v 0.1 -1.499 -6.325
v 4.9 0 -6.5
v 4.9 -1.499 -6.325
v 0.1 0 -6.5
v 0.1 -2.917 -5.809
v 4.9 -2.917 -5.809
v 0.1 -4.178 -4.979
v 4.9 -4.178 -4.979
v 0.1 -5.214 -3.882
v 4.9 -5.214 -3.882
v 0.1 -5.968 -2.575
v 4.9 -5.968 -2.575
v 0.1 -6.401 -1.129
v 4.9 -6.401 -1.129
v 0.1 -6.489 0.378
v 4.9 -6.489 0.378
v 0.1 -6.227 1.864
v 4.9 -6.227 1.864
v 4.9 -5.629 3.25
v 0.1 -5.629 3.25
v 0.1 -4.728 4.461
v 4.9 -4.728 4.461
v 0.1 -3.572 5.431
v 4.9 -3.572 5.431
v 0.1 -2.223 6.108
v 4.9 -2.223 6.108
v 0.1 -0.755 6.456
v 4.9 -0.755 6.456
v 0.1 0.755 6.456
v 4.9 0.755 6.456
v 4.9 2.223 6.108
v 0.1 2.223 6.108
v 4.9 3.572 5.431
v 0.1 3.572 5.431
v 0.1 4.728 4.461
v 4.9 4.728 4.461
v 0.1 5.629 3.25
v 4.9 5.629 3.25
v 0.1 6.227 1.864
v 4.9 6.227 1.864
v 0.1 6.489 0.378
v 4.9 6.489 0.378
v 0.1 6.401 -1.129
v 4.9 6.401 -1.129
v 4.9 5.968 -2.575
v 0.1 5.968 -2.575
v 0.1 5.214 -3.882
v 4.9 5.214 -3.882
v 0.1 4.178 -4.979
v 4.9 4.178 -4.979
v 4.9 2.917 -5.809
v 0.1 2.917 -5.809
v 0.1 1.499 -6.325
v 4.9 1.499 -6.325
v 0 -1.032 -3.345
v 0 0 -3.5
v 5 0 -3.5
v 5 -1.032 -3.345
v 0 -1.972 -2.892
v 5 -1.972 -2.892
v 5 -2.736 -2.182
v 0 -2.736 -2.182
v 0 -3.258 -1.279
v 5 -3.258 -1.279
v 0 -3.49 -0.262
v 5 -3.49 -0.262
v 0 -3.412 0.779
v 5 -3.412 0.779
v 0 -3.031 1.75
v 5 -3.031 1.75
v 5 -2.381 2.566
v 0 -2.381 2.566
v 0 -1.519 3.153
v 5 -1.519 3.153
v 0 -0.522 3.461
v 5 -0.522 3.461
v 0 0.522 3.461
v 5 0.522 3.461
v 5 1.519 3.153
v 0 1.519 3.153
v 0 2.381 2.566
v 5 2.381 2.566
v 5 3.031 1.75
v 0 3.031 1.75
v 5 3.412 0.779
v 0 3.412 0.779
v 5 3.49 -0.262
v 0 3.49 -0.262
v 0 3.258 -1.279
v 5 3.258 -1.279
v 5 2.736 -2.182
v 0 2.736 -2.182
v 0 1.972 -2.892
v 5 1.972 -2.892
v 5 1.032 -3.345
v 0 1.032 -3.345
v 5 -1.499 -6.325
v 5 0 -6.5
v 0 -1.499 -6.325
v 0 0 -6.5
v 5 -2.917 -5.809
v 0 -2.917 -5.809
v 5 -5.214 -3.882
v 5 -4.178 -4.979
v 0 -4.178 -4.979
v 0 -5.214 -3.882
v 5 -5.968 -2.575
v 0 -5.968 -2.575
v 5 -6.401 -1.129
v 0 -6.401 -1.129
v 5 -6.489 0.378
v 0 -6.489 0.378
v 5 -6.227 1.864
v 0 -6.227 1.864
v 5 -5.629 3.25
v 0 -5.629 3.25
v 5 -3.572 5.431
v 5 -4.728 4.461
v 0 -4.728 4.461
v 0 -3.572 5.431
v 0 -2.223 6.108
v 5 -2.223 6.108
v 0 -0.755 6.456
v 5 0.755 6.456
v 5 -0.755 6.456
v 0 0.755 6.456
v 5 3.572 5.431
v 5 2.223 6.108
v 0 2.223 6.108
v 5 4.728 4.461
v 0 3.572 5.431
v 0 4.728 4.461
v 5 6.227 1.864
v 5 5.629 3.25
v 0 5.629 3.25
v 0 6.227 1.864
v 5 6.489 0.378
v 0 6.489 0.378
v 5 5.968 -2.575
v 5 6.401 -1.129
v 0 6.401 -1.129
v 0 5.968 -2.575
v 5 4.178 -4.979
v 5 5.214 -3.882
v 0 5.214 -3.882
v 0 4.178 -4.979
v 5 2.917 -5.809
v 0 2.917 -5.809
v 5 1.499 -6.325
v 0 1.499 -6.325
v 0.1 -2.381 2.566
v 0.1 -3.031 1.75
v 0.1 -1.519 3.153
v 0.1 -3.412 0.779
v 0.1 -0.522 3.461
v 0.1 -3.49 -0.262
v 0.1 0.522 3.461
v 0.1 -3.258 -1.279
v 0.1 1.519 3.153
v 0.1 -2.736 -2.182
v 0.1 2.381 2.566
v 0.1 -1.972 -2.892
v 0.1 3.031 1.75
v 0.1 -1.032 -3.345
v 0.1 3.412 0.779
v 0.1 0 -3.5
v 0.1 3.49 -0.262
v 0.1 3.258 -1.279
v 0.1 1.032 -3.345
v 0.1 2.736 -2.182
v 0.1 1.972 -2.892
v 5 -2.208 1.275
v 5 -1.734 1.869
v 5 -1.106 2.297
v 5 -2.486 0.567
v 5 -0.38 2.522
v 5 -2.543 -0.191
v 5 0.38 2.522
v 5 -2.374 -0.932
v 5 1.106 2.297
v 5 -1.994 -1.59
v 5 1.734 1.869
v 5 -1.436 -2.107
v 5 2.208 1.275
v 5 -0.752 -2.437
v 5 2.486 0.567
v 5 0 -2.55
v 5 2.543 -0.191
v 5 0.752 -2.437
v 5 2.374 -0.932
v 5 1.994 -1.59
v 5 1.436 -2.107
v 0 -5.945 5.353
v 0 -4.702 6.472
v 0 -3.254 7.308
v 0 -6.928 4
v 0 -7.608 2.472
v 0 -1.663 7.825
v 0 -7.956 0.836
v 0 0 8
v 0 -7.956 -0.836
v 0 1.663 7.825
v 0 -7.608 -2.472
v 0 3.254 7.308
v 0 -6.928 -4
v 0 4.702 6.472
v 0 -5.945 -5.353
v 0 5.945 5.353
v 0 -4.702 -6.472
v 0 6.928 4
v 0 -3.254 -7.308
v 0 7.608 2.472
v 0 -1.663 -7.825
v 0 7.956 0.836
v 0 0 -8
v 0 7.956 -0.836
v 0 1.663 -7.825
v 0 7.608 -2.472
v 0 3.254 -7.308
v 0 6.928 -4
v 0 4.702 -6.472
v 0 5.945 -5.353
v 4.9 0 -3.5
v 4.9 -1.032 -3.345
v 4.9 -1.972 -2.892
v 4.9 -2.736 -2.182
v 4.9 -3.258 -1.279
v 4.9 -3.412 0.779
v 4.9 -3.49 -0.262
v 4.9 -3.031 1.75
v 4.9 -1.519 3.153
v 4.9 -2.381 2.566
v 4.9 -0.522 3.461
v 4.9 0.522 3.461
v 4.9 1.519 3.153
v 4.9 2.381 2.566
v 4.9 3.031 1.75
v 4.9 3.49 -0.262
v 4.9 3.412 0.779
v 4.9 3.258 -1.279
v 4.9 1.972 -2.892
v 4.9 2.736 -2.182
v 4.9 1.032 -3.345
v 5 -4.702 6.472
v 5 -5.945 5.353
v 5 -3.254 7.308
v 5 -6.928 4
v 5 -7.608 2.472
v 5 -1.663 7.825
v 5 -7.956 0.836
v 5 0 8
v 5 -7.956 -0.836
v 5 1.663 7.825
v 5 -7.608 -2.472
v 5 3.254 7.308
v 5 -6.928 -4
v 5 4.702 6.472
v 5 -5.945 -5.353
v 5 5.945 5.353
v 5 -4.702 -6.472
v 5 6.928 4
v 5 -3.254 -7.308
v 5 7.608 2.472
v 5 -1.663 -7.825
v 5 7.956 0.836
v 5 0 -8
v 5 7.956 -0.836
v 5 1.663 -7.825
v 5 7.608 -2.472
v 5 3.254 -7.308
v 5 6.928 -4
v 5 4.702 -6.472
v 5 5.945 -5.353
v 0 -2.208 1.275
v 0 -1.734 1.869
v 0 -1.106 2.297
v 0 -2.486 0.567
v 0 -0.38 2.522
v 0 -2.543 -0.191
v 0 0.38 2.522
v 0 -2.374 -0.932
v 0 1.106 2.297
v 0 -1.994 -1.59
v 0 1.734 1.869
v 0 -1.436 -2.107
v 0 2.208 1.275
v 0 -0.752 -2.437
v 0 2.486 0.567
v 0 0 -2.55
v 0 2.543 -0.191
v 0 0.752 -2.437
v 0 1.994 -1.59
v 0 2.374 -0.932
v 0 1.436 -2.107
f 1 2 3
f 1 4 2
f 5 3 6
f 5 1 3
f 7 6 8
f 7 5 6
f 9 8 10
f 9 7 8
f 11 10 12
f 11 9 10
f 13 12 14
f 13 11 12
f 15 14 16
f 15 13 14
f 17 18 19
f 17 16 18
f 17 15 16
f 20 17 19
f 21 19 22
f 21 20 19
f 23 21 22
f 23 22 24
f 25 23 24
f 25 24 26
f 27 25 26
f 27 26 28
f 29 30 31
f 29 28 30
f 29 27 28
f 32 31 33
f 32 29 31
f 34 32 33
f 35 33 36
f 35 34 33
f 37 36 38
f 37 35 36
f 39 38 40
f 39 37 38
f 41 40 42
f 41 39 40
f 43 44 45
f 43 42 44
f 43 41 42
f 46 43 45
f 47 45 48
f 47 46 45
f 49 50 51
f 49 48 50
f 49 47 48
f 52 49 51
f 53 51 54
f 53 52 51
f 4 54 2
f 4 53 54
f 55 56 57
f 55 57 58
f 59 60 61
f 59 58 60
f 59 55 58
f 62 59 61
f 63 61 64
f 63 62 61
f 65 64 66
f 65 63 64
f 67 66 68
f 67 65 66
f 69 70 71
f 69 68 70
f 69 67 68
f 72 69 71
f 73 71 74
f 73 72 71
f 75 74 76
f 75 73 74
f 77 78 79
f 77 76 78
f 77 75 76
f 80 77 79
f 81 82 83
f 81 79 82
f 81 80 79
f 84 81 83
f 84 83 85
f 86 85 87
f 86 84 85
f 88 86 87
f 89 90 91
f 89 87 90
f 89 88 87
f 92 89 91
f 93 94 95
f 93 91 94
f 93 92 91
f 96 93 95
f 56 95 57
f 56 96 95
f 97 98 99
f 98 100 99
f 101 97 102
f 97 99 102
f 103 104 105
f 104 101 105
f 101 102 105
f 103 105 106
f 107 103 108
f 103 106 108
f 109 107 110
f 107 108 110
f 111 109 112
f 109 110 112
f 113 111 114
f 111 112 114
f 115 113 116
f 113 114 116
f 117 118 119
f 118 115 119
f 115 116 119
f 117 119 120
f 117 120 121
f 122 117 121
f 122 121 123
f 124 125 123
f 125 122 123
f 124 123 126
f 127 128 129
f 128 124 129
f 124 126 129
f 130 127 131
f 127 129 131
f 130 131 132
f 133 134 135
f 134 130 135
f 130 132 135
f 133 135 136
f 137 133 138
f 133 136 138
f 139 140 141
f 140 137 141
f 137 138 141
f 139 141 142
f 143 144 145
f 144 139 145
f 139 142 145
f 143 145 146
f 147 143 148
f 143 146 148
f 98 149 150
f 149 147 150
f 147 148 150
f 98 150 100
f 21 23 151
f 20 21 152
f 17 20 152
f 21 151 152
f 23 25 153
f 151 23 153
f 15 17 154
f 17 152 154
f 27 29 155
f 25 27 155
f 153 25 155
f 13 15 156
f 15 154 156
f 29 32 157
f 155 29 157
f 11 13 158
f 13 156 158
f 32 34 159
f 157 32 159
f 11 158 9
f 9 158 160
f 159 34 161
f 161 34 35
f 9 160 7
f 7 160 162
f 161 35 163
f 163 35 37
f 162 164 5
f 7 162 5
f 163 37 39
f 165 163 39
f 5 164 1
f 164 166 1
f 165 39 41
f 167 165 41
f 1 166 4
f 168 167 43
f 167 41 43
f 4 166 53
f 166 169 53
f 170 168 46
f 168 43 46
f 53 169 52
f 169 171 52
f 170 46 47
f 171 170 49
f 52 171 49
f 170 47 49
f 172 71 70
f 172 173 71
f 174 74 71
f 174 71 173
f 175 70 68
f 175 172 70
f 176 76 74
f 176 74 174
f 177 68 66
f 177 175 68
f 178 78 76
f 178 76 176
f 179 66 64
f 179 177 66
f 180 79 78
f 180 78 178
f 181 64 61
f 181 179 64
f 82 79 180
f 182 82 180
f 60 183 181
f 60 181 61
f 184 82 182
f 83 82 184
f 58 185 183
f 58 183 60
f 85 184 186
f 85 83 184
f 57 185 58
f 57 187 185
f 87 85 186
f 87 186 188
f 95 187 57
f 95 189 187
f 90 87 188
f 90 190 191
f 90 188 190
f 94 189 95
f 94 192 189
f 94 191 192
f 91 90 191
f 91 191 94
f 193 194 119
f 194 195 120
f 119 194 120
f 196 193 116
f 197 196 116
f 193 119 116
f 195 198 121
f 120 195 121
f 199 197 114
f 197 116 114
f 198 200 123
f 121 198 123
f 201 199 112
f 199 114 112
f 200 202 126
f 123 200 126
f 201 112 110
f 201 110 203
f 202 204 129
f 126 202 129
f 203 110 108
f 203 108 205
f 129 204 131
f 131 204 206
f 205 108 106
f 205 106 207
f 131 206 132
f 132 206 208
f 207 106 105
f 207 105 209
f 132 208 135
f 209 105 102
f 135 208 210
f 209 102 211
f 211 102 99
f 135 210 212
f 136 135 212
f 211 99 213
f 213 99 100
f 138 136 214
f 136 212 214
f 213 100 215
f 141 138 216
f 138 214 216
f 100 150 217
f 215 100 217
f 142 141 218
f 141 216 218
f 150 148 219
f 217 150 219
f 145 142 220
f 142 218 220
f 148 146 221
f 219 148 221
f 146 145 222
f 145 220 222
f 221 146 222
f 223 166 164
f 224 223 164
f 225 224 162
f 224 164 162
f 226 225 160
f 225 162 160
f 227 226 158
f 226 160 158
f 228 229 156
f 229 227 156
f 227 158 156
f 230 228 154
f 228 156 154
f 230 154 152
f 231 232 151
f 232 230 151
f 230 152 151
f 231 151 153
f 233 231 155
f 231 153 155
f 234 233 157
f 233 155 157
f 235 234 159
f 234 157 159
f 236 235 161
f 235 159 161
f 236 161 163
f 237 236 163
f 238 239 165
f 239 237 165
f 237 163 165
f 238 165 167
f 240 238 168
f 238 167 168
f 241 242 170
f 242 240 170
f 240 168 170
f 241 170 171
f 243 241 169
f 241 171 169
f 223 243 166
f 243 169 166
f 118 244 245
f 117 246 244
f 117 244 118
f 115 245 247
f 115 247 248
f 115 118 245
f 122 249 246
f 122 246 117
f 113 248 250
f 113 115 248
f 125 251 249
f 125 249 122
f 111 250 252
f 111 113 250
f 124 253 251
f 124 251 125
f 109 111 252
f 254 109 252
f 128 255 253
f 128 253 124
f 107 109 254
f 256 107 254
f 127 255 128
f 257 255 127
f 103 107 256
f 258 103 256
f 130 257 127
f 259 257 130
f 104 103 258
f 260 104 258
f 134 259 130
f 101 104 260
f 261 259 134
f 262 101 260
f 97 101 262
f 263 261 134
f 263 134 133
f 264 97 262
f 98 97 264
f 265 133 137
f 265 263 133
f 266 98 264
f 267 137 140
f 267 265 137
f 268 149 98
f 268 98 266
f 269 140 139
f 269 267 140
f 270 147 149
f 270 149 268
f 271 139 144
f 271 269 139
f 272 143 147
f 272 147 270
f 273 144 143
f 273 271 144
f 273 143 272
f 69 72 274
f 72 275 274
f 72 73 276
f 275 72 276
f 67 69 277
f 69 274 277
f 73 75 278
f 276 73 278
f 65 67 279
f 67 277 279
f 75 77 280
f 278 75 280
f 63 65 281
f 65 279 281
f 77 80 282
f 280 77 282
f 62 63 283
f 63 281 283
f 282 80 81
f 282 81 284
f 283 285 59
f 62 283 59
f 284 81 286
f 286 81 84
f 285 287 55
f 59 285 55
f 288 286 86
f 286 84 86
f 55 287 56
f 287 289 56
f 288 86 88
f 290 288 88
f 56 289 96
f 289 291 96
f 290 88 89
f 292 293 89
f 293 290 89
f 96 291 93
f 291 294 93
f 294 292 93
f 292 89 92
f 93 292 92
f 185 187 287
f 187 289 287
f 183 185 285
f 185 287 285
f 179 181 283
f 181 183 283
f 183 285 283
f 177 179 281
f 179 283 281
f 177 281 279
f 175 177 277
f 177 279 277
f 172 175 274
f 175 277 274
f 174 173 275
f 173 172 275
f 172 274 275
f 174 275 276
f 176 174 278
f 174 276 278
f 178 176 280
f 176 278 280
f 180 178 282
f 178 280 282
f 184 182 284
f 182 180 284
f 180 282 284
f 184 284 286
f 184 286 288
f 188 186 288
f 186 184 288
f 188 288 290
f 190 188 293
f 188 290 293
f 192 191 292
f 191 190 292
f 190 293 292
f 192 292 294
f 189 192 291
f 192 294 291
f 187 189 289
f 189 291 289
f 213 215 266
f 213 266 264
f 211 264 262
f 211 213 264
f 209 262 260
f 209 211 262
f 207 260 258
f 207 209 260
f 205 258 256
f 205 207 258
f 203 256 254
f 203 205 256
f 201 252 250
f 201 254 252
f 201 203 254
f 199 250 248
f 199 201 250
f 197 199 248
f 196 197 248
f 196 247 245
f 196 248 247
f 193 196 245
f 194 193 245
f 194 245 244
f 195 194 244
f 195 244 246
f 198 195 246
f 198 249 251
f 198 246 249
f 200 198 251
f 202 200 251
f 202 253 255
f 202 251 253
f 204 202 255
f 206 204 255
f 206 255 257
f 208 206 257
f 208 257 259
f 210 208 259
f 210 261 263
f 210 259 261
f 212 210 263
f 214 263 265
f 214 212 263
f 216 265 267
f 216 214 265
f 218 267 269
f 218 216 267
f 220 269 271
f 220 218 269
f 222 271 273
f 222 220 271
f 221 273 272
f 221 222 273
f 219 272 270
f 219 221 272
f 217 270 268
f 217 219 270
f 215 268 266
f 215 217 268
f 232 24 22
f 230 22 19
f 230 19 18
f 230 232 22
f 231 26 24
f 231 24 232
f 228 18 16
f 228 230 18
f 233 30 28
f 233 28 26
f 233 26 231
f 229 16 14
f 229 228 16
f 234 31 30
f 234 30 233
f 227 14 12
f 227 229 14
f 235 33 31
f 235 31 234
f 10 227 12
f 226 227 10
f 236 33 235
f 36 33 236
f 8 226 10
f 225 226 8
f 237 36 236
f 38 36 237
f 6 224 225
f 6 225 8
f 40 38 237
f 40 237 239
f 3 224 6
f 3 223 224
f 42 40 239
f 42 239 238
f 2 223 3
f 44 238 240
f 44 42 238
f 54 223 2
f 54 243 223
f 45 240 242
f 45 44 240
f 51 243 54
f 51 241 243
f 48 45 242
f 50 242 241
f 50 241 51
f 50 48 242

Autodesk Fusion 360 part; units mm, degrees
sketch "Sketch1" plane through (0, 0, 0) normal (1, 0, 0) x (0, 0, -1)
  circle A0 centre (0, 0) radius 2.55
  circle A1 centre (0, 0) radius 8
  circle A2 centre (0, 0) radius 3.5
  circle A3 centre (0, 0) radius 6.5
  dimension "d1" = 5.1
  dimension "d2" = 16
  dimension "d3" = 7
  dimension "d4" = 13
extrude "Extrude1" add sketch "Sketch1" along normal blind 5 makes body 1 at (3.3333, -0.3988, -7.9901) makes body 2 at (3.3333, -0.1745, -3.4956)
extrude "Extrude2" add sketch "Sketch1" along normal blind 4.8 from surface at 0.1 separate body contours A3 makes body 3
